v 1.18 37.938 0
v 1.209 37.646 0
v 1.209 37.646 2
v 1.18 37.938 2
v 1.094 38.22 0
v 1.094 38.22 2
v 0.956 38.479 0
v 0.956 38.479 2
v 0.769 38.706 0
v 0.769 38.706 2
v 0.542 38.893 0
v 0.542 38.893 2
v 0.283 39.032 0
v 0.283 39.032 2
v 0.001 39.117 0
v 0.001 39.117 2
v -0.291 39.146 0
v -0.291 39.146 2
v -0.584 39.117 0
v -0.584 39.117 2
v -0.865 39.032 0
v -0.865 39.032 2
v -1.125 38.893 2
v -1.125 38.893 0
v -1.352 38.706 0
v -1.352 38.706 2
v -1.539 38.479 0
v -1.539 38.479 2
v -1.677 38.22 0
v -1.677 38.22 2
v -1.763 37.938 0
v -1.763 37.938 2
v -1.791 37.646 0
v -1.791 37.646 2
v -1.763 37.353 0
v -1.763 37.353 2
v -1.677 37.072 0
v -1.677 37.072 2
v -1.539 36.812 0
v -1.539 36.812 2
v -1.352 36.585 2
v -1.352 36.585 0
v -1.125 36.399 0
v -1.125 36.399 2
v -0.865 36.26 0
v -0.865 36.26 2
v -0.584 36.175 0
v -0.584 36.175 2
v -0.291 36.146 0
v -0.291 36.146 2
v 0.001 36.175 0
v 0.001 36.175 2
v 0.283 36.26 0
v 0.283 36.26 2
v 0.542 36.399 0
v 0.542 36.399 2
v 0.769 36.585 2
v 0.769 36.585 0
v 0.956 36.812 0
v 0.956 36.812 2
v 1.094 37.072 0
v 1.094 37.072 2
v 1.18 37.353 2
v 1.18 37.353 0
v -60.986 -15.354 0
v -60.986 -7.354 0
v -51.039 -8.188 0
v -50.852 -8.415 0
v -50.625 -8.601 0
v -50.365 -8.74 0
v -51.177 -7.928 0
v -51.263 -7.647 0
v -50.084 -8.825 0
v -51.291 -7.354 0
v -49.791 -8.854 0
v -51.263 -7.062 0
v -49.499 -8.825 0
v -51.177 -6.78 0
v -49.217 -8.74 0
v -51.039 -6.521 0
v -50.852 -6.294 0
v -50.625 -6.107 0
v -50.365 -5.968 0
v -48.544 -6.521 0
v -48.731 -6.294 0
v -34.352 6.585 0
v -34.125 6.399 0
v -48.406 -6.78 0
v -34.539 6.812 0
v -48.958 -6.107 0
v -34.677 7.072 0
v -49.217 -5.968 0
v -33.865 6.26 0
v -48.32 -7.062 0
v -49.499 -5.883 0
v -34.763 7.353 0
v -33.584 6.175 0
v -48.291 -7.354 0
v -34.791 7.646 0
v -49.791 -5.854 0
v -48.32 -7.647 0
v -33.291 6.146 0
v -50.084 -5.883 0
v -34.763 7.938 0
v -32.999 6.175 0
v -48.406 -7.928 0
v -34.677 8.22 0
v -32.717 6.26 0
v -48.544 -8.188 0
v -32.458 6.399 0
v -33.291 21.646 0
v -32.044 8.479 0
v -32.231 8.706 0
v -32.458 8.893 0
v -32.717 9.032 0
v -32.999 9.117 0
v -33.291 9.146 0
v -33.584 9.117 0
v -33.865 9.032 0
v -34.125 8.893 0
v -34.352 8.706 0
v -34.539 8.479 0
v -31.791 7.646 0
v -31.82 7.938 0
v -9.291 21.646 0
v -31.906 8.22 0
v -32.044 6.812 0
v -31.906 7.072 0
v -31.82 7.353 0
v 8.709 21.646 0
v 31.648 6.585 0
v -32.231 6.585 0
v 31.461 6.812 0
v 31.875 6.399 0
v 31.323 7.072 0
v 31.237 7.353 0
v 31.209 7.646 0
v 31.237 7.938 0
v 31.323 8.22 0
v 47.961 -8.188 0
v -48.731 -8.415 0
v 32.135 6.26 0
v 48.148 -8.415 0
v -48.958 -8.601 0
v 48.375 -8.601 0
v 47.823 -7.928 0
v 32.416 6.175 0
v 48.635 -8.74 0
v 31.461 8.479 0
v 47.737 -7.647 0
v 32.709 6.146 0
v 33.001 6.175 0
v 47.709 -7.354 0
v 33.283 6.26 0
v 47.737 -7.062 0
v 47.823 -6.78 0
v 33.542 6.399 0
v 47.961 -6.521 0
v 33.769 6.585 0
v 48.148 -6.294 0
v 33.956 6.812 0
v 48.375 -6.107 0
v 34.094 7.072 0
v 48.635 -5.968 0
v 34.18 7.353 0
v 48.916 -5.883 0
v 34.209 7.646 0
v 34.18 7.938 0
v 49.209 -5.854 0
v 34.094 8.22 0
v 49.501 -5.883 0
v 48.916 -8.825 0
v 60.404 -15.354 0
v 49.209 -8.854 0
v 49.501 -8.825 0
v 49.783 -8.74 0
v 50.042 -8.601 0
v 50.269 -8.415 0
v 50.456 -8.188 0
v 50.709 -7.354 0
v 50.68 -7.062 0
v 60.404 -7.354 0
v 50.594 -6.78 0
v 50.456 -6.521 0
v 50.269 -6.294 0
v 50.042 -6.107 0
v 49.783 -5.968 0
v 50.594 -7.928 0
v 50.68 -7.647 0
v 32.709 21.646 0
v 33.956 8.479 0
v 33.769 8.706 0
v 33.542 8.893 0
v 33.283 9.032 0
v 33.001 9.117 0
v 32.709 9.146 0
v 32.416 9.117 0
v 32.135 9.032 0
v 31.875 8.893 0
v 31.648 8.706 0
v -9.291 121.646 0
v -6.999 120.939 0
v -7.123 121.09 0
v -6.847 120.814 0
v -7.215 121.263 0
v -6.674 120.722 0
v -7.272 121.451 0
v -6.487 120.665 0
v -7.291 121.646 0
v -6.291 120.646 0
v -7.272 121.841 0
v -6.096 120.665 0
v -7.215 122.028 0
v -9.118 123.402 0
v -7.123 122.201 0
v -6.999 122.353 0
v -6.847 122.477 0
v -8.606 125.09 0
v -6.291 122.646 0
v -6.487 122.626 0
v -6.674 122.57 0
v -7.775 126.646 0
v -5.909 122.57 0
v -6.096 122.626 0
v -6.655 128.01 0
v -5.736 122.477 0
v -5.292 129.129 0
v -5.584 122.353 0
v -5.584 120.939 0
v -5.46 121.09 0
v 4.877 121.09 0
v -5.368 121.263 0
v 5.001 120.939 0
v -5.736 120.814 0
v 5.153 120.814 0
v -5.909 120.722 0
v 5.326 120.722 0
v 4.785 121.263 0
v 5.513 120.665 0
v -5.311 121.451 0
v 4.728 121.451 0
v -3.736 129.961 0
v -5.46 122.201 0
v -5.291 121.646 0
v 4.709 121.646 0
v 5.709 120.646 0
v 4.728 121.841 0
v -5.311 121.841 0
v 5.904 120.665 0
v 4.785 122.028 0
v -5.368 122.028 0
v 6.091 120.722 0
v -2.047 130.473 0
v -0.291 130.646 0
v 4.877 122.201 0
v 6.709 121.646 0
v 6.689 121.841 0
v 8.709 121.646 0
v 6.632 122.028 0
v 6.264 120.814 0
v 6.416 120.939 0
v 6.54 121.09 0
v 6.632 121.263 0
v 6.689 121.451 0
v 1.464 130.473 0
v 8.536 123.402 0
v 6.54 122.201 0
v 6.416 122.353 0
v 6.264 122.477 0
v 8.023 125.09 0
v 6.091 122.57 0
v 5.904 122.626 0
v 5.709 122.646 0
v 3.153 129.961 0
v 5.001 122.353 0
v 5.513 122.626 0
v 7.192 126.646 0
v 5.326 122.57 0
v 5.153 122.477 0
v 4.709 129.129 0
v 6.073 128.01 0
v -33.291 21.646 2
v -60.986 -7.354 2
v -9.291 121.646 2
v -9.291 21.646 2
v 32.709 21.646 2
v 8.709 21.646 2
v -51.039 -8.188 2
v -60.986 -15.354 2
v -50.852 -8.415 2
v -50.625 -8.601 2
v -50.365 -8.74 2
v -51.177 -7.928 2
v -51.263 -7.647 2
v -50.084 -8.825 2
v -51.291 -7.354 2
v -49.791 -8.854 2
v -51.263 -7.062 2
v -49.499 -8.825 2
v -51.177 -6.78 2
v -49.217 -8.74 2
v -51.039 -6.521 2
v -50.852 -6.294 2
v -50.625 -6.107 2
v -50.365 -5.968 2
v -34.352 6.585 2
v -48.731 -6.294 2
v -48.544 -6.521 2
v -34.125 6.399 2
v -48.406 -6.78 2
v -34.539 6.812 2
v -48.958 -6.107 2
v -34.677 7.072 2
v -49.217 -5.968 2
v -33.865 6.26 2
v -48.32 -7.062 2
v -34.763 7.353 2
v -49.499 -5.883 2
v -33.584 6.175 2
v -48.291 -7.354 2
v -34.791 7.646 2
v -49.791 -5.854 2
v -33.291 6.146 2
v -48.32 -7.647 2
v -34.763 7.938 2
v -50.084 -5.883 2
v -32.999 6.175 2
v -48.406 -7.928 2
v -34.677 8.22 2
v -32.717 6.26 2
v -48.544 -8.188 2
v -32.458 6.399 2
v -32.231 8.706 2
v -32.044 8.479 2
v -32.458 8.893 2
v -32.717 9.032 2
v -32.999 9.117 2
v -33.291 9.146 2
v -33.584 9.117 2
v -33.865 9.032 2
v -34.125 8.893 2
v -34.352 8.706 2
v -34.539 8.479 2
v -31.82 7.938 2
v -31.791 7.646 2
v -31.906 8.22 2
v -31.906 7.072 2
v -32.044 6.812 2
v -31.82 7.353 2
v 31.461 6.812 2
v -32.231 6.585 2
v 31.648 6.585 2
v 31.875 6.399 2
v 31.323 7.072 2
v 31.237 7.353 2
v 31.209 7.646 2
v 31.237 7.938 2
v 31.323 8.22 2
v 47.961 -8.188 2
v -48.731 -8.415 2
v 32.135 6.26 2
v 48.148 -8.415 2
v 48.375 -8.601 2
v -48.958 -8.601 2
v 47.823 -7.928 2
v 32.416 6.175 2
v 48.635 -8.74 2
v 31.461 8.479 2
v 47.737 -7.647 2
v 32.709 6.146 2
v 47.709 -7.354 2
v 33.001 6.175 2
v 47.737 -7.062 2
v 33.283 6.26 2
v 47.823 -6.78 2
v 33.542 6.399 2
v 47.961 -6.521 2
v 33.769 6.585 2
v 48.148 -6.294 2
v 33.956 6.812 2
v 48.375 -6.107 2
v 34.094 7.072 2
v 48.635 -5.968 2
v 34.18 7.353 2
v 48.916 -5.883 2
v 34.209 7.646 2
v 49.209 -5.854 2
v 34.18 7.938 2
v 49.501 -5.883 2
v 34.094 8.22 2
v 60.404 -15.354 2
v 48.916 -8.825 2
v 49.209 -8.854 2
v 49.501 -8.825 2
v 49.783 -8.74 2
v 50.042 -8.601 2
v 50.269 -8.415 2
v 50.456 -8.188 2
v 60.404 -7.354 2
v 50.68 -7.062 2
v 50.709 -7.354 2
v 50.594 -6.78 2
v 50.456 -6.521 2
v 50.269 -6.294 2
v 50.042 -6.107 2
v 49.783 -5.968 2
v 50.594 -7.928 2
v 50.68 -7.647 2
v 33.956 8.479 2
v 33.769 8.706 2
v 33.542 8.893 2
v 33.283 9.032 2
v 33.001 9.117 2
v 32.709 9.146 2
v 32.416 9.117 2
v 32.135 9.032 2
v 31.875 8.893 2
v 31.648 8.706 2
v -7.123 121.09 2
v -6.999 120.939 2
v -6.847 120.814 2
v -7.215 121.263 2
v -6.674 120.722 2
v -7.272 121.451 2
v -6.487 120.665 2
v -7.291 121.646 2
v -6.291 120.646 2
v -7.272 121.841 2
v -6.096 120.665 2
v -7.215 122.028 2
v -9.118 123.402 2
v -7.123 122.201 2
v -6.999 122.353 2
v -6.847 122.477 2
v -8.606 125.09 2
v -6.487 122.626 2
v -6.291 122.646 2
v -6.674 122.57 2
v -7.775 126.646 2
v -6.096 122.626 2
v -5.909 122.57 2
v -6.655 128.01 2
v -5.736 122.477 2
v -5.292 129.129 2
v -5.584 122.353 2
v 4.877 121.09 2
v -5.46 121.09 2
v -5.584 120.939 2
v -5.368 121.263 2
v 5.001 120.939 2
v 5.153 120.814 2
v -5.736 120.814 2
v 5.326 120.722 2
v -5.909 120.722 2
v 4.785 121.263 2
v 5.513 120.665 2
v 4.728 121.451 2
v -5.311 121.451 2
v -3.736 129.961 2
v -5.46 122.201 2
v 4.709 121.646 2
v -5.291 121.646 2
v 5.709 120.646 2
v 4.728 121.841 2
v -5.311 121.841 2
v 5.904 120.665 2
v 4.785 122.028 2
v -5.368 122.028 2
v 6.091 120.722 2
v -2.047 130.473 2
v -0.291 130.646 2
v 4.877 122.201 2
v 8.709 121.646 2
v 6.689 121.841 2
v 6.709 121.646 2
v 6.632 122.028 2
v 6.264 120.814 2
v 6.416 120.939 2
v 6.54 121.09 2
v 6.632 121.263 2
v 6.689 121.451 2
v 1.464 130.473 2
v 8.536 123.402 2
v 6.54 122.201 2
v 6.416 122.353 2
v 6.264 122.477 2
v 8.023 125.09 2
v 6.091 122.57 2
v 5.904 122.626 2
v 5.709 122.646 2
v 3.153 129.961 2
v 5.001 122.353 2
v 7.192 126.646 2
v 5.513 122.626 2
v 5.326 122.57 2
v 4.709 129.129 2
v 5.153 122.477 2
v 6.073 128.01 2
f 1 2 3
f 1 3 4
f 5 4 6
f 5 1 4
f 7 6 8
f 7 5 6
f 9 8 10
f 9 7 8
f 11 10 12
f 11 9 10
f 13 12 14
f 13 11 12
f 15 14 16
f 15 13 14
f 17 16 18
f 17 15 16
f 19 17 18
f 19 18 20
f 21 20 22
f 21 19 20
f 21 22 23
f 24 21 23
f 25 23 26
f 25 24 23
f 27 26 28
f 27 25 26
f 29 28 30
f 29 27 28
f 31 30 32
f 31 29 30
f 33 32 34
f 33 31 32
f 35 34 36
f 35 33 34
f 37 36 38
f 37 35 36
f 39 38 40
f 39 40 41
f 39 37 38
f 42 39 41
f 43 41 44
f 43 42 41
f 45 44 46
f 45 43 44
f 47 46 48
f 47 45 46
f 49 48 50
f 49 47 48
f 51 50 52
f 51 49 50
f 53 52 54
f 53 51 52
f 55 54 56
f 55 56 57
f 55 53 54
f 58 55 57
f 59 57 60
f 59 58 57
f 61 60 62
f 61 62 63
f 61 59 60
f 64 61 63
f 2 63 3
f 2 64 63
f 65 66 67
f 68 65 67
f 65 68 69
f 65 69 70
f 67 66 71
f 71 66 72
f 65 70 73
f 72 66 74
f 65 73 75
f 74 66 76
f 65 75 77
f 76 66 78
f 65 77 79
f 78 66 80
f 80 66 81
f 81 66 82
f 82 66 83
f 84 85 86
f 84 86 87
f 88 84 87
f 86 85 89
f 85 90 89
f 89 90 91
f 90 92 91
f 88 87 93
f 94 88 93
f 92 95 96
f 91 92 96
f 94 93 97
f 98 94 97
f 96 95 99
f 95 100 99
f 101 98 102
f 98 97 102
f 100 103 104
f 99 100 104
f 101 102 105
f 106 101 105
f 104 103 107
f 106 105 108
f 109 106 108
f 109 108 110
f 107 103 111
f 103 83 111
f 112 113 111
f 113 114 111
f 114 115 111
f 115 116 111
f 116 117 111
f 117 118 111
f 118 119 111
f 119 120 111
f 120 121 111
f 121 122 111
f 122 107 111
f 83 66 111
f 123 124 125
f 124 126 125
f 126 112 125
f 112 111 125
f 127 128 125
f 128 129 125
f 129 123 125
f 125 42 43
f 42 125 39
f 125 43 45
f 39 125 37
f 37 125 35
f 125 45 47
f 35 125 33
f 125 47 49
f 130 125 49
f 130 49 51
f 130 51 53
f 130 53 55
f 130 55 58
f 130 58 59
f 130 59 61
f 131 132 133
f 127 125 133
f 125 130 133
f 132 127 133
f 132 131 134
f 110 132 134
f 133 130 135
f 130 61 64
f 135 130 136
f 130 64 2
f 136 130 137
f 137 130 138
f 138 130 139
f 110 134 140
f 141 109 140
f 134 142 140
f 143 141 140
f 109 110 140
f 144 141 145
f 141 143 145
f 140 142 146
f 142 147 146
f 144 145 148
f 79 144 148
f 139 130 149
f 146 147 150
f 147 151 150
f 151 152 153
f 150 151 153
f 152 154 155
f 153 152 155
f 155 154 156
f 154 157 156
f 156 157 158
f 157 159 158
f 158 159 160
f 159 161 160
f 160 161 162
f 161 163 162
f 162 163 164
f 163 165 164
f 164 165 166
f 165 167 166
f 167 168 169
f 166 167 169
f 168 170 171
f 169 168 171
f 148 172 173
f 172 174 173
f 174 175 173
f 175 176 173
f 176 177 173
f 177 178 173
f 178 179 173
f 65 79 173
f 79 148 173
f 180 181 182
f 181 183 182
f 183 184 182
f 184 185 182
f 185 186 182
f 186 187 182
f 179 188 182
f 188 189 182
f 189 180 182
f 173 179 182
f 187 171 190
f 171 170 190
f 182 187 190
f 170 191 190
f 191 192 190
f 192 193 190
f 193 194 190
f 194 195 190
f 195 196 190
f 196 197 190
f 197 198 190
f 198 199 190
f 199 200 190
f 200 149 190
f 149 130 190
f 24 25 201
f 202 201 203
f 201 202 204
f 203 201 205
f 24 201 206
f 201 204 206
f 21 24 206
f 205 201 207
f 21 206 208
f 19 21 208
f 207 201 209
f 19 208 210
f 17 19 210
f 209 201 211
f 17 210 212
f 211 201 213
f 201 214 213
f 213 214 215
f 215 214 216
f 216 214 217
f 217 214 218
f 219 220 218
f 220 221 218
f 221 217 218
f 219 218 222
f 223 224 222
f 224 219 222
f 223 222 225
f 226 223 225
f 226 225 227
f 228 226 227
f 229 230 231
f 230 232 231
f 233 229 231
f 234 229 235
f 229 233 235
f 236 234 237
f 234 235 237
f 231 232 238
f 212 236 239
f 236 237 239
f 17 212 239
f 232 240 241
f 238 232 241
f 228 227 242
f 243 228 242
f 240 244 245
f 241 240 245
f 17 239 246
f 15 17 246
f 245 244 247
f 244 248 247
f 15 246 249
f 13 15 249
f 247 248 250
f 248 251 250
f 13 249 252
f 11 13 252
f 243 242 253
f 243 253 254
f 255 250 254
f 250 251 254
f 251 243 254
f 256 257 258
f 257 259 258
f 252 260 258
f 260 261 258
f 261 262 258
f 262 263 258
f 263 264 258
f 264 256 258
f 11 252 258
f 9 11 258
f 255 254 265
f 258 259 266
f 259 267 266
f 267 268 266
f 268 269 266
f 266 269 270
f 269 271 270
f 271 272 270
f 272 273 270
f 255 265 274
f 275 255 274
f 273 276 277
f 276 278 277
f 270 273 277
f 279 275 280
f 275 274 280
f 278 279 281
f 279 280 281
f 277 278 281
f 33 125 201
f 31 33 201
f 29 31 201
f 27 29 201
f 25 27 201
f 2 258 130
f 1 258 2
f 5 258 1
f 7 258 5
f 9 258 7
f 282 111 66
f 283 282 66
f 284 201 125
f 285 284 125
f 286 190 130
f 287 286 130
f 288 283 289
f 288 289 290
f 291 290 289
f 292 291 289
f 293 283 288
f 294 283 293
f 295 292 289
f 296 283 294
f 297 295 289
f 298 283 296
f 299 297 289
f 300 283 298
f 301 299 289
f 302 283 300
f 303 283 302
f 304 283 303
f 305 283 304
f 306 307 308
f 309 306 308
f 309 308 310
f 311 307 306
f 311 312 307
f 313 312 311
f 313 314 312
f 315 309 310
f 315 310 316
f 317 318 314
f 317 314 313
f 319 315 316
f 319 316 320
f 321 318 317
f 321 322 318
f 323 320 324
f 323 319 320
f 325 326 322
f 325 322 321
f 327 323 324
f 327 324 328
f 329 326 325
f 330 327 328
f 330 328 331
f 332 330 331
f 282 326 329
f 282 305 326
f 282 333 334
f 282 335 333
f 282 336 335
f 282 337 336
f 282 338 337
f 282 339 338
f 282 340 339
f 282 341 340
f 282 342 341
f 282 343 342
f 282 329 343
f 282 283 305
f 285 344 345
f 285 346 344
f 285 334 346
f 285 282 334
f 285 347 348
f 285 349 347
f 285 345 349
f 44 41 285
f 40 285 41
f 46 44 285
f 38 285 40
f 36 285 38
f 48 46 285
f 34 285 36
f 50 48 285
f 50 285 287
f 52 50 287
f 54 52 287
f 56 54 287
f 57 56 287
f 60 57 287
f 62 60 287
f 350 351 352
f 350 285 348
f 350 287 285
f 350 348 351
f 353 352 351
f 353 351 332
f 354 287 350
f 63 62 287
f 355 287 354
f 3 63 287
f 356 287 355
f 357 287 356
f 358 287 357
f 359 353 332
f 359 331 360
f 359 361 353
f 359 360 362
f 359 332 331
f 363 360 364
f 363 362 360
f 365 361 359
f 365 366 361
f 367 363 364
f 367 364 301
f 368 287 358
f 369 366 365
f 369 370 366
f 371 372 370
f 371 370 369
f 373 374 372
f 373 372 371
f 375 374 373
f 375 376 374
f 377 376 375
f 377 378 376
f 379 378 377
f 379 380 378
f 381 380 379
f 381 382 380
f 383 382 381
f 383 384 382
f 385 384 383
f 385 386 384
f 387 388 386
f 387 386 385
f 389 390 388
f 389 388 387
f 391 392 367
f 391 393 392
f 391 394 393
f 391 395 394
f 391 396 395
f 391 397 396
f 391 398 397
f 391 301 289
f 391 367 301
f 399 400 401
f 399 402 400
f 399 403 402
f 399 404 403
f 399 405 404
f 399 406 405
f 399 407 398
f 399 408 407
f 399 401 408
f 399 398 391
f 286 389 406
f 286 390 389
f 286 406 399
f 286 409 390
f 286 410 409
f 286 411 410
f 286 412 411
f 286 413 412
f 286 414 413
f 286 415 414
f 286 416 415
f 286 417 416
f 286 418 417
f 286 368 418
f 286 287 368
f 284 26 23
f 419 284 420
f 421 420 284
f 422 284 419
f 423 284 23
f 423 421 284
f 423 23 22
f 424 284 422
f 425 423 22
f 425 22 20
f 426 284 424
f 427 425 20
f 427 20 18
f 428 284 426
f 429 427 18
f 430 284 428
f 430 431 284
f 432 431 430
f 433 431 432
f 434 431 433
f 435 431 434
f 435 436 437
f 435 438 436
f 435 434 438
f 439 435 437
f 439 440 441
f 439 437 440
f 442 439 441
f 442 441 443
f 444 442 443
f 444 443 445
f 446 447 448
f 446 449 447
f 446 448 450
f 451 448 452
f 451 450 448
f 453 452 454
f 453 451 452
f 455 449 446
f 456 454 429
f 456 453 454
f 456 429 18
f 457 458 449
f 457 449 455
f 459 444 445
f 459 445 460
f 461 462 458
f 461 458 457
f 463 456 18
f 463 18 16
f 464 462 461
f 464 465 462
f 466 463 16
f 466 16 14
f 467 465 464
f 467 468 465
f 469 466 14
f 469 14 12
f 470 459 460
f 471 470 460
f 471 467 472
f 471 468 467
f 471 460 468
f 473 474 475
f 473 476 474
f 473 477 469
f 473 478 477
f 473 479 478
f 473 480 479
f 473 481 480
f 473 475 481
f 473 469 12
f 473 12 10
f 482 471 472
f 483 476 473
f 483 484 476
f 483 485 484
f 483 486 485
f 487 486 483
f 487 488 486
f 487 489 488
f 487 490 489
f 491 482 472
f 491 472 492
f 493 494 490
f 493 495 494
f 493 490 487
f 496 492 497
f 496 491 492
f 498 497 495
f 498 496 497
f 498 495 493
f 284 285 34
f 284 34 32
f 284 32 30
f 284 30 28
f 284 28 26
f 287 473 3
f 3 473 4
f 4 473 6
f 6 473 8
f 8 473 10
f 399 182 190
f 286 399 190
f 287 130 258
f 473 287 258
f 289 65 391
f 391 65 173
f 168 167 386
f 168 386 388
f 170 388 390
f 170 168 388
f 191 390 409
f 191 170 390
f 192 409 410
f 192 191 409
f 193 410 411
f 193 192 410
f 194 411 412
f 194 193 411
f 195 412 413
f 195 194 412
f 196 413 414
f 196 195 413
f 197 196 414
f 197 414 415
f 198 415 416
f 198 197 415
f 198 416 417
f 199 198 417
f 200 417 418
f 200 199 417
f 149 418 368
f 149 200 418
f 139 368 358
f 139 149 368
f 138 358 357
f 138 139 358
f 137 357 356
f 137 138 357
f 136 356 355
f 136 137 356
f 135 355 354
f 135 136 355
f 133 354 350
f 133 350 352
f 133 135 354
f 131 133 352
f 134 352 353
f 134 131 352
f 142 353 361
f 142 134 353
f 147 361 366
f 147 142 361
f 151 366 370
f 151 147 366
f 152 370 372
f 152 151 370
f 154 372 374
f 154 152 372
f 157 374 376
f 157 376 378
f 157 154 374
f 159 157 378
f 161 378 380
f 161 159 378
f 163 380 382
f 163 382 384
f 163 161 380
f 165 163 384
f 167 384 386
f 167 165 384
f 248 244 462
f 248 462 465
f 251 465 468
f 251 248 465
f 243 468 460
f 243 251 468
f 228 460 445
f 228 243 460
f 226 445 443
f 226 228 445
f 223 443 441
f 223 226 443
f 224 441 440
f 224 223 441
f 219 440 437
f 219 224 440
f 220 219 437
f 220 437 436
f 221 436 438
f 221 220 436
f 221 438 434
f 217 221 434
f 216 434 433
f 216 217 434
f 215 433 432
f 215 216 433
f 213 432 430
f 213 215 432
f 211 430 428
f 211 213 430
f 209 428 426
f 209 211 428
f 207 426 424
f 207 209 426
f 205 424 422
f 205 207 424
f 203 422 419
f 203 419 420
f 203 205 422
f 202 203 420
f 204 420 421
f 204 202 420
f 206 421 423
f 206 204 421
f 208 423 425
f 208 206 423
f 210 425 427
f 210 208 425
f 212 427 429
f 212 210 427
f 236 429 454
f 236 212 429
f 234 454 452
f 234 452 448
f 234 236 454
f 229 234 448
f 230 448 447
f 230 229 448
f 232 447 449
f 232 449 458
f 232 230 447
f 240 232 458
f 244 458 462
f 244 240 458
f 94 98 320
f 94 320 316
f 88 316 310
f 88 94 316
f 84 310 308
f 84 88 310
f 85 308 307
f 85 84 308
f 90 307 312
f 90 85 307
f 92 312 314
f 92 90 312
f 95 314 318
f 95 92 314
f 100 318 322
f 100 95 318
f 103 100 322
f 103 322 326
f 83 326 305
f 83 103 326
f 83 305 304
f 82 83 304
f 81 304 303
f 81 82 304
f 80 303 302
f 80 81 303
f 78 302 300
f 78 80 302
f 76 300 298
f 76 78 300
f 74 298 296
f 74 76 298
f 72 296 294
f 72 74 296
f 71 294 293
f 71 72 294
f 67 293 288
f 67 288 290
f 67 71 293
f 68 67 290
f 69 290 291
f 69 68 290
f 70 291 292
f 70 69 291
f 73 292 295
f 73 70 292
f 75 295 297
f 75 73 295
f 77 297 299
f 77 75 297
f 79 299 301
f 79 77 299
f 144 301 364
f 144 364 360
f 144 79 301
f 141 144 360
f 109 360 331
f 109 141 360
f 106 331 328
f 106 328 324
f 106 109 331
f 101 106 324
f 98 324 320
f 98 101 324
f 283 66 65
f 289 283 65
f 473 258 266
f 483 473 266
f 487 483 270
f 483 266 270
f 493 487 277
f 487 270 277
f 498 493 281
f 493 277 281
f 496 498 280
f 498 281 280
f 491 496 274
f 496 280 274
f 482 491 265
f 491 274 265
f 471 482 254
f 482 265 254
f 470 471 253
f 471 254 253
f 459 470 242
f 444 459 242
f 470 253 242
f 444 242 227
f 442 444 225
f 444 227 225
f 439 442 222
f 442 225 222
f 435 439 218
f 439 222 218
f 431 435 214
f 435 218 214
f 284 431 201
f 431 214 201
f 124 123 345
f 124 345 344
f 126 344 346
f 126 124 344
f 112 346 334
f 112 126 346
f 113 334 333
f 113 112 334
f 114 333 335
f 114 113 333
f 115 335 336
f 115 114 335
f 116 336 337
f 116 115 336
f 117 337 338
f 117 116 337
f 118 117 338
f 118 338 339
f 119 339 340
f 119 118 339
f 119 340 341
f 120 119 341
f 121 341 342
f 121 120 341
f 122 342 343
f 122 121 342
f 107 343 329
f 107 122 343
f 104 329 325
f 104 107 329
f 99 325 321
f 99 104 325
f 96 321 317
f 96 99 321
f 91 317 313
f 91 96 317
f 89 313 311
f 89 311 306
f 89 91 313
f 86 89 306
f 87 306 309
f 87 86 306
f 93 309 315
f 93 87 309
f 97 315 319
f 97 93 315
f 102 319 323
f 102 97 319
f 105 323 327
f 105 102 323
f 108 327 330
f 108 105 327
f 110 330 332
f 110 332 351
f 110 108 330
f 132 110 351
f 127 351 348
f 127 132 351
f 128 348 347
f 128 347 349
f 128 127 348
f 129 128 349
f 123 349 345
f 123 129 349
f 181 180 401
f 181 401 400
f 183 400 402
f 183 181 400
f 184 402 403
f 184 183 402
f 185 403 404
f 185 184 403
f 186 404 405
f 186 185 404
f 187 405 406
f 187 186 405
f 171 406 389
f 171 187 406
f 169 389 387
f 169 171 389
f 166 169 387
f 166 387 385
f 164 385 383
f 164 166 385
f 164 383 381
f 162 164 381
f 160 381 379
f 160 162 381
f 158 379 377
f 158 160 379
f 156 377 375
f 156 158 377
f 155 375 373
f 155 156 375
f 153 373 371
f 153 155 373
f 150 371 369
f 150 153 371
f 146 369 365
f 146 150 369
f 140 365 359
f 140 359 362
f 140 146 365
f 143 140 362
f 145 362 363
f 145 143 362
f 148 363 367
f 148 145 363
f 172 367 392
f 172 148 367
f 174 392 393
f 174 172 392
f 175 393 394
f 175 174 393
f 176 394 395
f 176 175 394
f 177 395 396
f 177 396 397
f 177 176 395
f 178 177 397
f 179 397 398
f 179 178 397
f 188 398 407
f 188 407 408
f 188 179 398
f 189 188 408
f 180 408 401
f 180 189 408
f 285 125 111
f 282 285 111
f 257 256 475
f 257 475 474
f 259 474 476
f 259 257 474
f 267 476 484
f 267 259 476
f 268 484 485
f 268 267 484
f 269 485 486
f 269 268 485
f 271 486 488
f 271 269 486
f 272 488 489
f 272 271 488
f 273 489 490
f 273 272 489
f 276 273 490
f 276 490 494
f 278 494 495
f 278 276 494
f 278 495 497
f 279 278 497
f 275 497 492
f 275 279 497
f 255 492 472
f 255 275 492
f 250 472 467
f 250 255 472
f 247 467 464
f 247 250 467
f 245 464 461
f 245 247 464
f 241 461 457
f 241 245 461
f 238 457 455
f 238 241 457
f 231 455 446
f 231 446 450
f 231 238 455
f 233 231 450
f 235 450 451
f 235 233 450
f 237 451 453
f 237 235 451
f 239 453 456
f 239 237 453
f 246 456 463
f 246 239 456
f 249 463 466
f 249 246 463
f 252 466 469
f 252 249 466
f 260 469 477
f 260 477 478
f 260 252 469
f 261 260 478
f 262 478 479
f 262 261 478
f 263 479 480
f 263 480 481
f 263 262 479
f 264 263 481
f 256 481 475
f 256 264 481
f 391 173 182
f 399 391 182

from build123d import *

# Parameters (mm, degrees)
SKETCH_1_R      = 1.5
SKETCH_1_R_2    = 1
EXTRUDE_1_DEPTH = 2


with BuildPart() as part:
    # 草图1 → 凸台-拉伸1 (new body)
    with BuildSketch(Plane.XY):
        with BuildLine():
            ThreePointArc((8.708571429, 121.645714286), (-0.291428571, 130.645714286), (-9.291428571, 121.645714286))
            Line((-9.291428571, 121.645714286), (-9.291428571, 21.645714286))
            Line((-9.291428571, 21.645714286), (-33.291428571, 21.645714286))
            Line((-33.291428571, 21.645714286), (-60.986481548, -7.354285714))
            Line((-60.986481548, -7.354285714), (-60.986481548, -15.354285714))
            Line((-60.986481548, -15.354285714), (60.403624405, -15.354285714))
            Line((60.403624405, -15.354285714), (60.403624405, -7.354285714))
            Line((60.403624405, -7.354285714), (32.708571429, 21.645714286))
            Line((32.708571429, 21.645714286), (8.708571429, 21.645714286))
            Line((8.708571429, 21.645714286), (8.708571429, 121.645714286))
        make_face()
        with Locations((-49.791428571, -7.354285714)):
            Circle(SKETCH_1_R, mode=Mode.SUBTRACT)
        with Locations((-33.291428571, 7.645714286)):
            Circle(SKETCH_1_R, mode=Mode.SUBTRACT)
        with Locations((-0.291428571, 37.645714286)):
            Circle(SKETCH_1_R, mode=Mode.SUBTRACT)
        with Locations((49.208571429, -7.354285714)):
            Circle(SKETCH_1_R, mode=Mode.SUBTRACT)
        with Locations((32.708571429, 7.645714286)):
            Circle(SKETCH_1_R, mode=Mode.SUBTRACT)
        with Locations((-6.291428571, 121.645714286)):
            Circle(SKETCH_1_R_2, mode=Mode.SUBTRACT)
        with Locations((5.708571429, 121.645714286)):
            Circle(SKETCH_1_R_2, mode=Mode.SUBTRACT)
    extrude(amount=EXTRUDE_1_DEPTH)


solid = part.part
